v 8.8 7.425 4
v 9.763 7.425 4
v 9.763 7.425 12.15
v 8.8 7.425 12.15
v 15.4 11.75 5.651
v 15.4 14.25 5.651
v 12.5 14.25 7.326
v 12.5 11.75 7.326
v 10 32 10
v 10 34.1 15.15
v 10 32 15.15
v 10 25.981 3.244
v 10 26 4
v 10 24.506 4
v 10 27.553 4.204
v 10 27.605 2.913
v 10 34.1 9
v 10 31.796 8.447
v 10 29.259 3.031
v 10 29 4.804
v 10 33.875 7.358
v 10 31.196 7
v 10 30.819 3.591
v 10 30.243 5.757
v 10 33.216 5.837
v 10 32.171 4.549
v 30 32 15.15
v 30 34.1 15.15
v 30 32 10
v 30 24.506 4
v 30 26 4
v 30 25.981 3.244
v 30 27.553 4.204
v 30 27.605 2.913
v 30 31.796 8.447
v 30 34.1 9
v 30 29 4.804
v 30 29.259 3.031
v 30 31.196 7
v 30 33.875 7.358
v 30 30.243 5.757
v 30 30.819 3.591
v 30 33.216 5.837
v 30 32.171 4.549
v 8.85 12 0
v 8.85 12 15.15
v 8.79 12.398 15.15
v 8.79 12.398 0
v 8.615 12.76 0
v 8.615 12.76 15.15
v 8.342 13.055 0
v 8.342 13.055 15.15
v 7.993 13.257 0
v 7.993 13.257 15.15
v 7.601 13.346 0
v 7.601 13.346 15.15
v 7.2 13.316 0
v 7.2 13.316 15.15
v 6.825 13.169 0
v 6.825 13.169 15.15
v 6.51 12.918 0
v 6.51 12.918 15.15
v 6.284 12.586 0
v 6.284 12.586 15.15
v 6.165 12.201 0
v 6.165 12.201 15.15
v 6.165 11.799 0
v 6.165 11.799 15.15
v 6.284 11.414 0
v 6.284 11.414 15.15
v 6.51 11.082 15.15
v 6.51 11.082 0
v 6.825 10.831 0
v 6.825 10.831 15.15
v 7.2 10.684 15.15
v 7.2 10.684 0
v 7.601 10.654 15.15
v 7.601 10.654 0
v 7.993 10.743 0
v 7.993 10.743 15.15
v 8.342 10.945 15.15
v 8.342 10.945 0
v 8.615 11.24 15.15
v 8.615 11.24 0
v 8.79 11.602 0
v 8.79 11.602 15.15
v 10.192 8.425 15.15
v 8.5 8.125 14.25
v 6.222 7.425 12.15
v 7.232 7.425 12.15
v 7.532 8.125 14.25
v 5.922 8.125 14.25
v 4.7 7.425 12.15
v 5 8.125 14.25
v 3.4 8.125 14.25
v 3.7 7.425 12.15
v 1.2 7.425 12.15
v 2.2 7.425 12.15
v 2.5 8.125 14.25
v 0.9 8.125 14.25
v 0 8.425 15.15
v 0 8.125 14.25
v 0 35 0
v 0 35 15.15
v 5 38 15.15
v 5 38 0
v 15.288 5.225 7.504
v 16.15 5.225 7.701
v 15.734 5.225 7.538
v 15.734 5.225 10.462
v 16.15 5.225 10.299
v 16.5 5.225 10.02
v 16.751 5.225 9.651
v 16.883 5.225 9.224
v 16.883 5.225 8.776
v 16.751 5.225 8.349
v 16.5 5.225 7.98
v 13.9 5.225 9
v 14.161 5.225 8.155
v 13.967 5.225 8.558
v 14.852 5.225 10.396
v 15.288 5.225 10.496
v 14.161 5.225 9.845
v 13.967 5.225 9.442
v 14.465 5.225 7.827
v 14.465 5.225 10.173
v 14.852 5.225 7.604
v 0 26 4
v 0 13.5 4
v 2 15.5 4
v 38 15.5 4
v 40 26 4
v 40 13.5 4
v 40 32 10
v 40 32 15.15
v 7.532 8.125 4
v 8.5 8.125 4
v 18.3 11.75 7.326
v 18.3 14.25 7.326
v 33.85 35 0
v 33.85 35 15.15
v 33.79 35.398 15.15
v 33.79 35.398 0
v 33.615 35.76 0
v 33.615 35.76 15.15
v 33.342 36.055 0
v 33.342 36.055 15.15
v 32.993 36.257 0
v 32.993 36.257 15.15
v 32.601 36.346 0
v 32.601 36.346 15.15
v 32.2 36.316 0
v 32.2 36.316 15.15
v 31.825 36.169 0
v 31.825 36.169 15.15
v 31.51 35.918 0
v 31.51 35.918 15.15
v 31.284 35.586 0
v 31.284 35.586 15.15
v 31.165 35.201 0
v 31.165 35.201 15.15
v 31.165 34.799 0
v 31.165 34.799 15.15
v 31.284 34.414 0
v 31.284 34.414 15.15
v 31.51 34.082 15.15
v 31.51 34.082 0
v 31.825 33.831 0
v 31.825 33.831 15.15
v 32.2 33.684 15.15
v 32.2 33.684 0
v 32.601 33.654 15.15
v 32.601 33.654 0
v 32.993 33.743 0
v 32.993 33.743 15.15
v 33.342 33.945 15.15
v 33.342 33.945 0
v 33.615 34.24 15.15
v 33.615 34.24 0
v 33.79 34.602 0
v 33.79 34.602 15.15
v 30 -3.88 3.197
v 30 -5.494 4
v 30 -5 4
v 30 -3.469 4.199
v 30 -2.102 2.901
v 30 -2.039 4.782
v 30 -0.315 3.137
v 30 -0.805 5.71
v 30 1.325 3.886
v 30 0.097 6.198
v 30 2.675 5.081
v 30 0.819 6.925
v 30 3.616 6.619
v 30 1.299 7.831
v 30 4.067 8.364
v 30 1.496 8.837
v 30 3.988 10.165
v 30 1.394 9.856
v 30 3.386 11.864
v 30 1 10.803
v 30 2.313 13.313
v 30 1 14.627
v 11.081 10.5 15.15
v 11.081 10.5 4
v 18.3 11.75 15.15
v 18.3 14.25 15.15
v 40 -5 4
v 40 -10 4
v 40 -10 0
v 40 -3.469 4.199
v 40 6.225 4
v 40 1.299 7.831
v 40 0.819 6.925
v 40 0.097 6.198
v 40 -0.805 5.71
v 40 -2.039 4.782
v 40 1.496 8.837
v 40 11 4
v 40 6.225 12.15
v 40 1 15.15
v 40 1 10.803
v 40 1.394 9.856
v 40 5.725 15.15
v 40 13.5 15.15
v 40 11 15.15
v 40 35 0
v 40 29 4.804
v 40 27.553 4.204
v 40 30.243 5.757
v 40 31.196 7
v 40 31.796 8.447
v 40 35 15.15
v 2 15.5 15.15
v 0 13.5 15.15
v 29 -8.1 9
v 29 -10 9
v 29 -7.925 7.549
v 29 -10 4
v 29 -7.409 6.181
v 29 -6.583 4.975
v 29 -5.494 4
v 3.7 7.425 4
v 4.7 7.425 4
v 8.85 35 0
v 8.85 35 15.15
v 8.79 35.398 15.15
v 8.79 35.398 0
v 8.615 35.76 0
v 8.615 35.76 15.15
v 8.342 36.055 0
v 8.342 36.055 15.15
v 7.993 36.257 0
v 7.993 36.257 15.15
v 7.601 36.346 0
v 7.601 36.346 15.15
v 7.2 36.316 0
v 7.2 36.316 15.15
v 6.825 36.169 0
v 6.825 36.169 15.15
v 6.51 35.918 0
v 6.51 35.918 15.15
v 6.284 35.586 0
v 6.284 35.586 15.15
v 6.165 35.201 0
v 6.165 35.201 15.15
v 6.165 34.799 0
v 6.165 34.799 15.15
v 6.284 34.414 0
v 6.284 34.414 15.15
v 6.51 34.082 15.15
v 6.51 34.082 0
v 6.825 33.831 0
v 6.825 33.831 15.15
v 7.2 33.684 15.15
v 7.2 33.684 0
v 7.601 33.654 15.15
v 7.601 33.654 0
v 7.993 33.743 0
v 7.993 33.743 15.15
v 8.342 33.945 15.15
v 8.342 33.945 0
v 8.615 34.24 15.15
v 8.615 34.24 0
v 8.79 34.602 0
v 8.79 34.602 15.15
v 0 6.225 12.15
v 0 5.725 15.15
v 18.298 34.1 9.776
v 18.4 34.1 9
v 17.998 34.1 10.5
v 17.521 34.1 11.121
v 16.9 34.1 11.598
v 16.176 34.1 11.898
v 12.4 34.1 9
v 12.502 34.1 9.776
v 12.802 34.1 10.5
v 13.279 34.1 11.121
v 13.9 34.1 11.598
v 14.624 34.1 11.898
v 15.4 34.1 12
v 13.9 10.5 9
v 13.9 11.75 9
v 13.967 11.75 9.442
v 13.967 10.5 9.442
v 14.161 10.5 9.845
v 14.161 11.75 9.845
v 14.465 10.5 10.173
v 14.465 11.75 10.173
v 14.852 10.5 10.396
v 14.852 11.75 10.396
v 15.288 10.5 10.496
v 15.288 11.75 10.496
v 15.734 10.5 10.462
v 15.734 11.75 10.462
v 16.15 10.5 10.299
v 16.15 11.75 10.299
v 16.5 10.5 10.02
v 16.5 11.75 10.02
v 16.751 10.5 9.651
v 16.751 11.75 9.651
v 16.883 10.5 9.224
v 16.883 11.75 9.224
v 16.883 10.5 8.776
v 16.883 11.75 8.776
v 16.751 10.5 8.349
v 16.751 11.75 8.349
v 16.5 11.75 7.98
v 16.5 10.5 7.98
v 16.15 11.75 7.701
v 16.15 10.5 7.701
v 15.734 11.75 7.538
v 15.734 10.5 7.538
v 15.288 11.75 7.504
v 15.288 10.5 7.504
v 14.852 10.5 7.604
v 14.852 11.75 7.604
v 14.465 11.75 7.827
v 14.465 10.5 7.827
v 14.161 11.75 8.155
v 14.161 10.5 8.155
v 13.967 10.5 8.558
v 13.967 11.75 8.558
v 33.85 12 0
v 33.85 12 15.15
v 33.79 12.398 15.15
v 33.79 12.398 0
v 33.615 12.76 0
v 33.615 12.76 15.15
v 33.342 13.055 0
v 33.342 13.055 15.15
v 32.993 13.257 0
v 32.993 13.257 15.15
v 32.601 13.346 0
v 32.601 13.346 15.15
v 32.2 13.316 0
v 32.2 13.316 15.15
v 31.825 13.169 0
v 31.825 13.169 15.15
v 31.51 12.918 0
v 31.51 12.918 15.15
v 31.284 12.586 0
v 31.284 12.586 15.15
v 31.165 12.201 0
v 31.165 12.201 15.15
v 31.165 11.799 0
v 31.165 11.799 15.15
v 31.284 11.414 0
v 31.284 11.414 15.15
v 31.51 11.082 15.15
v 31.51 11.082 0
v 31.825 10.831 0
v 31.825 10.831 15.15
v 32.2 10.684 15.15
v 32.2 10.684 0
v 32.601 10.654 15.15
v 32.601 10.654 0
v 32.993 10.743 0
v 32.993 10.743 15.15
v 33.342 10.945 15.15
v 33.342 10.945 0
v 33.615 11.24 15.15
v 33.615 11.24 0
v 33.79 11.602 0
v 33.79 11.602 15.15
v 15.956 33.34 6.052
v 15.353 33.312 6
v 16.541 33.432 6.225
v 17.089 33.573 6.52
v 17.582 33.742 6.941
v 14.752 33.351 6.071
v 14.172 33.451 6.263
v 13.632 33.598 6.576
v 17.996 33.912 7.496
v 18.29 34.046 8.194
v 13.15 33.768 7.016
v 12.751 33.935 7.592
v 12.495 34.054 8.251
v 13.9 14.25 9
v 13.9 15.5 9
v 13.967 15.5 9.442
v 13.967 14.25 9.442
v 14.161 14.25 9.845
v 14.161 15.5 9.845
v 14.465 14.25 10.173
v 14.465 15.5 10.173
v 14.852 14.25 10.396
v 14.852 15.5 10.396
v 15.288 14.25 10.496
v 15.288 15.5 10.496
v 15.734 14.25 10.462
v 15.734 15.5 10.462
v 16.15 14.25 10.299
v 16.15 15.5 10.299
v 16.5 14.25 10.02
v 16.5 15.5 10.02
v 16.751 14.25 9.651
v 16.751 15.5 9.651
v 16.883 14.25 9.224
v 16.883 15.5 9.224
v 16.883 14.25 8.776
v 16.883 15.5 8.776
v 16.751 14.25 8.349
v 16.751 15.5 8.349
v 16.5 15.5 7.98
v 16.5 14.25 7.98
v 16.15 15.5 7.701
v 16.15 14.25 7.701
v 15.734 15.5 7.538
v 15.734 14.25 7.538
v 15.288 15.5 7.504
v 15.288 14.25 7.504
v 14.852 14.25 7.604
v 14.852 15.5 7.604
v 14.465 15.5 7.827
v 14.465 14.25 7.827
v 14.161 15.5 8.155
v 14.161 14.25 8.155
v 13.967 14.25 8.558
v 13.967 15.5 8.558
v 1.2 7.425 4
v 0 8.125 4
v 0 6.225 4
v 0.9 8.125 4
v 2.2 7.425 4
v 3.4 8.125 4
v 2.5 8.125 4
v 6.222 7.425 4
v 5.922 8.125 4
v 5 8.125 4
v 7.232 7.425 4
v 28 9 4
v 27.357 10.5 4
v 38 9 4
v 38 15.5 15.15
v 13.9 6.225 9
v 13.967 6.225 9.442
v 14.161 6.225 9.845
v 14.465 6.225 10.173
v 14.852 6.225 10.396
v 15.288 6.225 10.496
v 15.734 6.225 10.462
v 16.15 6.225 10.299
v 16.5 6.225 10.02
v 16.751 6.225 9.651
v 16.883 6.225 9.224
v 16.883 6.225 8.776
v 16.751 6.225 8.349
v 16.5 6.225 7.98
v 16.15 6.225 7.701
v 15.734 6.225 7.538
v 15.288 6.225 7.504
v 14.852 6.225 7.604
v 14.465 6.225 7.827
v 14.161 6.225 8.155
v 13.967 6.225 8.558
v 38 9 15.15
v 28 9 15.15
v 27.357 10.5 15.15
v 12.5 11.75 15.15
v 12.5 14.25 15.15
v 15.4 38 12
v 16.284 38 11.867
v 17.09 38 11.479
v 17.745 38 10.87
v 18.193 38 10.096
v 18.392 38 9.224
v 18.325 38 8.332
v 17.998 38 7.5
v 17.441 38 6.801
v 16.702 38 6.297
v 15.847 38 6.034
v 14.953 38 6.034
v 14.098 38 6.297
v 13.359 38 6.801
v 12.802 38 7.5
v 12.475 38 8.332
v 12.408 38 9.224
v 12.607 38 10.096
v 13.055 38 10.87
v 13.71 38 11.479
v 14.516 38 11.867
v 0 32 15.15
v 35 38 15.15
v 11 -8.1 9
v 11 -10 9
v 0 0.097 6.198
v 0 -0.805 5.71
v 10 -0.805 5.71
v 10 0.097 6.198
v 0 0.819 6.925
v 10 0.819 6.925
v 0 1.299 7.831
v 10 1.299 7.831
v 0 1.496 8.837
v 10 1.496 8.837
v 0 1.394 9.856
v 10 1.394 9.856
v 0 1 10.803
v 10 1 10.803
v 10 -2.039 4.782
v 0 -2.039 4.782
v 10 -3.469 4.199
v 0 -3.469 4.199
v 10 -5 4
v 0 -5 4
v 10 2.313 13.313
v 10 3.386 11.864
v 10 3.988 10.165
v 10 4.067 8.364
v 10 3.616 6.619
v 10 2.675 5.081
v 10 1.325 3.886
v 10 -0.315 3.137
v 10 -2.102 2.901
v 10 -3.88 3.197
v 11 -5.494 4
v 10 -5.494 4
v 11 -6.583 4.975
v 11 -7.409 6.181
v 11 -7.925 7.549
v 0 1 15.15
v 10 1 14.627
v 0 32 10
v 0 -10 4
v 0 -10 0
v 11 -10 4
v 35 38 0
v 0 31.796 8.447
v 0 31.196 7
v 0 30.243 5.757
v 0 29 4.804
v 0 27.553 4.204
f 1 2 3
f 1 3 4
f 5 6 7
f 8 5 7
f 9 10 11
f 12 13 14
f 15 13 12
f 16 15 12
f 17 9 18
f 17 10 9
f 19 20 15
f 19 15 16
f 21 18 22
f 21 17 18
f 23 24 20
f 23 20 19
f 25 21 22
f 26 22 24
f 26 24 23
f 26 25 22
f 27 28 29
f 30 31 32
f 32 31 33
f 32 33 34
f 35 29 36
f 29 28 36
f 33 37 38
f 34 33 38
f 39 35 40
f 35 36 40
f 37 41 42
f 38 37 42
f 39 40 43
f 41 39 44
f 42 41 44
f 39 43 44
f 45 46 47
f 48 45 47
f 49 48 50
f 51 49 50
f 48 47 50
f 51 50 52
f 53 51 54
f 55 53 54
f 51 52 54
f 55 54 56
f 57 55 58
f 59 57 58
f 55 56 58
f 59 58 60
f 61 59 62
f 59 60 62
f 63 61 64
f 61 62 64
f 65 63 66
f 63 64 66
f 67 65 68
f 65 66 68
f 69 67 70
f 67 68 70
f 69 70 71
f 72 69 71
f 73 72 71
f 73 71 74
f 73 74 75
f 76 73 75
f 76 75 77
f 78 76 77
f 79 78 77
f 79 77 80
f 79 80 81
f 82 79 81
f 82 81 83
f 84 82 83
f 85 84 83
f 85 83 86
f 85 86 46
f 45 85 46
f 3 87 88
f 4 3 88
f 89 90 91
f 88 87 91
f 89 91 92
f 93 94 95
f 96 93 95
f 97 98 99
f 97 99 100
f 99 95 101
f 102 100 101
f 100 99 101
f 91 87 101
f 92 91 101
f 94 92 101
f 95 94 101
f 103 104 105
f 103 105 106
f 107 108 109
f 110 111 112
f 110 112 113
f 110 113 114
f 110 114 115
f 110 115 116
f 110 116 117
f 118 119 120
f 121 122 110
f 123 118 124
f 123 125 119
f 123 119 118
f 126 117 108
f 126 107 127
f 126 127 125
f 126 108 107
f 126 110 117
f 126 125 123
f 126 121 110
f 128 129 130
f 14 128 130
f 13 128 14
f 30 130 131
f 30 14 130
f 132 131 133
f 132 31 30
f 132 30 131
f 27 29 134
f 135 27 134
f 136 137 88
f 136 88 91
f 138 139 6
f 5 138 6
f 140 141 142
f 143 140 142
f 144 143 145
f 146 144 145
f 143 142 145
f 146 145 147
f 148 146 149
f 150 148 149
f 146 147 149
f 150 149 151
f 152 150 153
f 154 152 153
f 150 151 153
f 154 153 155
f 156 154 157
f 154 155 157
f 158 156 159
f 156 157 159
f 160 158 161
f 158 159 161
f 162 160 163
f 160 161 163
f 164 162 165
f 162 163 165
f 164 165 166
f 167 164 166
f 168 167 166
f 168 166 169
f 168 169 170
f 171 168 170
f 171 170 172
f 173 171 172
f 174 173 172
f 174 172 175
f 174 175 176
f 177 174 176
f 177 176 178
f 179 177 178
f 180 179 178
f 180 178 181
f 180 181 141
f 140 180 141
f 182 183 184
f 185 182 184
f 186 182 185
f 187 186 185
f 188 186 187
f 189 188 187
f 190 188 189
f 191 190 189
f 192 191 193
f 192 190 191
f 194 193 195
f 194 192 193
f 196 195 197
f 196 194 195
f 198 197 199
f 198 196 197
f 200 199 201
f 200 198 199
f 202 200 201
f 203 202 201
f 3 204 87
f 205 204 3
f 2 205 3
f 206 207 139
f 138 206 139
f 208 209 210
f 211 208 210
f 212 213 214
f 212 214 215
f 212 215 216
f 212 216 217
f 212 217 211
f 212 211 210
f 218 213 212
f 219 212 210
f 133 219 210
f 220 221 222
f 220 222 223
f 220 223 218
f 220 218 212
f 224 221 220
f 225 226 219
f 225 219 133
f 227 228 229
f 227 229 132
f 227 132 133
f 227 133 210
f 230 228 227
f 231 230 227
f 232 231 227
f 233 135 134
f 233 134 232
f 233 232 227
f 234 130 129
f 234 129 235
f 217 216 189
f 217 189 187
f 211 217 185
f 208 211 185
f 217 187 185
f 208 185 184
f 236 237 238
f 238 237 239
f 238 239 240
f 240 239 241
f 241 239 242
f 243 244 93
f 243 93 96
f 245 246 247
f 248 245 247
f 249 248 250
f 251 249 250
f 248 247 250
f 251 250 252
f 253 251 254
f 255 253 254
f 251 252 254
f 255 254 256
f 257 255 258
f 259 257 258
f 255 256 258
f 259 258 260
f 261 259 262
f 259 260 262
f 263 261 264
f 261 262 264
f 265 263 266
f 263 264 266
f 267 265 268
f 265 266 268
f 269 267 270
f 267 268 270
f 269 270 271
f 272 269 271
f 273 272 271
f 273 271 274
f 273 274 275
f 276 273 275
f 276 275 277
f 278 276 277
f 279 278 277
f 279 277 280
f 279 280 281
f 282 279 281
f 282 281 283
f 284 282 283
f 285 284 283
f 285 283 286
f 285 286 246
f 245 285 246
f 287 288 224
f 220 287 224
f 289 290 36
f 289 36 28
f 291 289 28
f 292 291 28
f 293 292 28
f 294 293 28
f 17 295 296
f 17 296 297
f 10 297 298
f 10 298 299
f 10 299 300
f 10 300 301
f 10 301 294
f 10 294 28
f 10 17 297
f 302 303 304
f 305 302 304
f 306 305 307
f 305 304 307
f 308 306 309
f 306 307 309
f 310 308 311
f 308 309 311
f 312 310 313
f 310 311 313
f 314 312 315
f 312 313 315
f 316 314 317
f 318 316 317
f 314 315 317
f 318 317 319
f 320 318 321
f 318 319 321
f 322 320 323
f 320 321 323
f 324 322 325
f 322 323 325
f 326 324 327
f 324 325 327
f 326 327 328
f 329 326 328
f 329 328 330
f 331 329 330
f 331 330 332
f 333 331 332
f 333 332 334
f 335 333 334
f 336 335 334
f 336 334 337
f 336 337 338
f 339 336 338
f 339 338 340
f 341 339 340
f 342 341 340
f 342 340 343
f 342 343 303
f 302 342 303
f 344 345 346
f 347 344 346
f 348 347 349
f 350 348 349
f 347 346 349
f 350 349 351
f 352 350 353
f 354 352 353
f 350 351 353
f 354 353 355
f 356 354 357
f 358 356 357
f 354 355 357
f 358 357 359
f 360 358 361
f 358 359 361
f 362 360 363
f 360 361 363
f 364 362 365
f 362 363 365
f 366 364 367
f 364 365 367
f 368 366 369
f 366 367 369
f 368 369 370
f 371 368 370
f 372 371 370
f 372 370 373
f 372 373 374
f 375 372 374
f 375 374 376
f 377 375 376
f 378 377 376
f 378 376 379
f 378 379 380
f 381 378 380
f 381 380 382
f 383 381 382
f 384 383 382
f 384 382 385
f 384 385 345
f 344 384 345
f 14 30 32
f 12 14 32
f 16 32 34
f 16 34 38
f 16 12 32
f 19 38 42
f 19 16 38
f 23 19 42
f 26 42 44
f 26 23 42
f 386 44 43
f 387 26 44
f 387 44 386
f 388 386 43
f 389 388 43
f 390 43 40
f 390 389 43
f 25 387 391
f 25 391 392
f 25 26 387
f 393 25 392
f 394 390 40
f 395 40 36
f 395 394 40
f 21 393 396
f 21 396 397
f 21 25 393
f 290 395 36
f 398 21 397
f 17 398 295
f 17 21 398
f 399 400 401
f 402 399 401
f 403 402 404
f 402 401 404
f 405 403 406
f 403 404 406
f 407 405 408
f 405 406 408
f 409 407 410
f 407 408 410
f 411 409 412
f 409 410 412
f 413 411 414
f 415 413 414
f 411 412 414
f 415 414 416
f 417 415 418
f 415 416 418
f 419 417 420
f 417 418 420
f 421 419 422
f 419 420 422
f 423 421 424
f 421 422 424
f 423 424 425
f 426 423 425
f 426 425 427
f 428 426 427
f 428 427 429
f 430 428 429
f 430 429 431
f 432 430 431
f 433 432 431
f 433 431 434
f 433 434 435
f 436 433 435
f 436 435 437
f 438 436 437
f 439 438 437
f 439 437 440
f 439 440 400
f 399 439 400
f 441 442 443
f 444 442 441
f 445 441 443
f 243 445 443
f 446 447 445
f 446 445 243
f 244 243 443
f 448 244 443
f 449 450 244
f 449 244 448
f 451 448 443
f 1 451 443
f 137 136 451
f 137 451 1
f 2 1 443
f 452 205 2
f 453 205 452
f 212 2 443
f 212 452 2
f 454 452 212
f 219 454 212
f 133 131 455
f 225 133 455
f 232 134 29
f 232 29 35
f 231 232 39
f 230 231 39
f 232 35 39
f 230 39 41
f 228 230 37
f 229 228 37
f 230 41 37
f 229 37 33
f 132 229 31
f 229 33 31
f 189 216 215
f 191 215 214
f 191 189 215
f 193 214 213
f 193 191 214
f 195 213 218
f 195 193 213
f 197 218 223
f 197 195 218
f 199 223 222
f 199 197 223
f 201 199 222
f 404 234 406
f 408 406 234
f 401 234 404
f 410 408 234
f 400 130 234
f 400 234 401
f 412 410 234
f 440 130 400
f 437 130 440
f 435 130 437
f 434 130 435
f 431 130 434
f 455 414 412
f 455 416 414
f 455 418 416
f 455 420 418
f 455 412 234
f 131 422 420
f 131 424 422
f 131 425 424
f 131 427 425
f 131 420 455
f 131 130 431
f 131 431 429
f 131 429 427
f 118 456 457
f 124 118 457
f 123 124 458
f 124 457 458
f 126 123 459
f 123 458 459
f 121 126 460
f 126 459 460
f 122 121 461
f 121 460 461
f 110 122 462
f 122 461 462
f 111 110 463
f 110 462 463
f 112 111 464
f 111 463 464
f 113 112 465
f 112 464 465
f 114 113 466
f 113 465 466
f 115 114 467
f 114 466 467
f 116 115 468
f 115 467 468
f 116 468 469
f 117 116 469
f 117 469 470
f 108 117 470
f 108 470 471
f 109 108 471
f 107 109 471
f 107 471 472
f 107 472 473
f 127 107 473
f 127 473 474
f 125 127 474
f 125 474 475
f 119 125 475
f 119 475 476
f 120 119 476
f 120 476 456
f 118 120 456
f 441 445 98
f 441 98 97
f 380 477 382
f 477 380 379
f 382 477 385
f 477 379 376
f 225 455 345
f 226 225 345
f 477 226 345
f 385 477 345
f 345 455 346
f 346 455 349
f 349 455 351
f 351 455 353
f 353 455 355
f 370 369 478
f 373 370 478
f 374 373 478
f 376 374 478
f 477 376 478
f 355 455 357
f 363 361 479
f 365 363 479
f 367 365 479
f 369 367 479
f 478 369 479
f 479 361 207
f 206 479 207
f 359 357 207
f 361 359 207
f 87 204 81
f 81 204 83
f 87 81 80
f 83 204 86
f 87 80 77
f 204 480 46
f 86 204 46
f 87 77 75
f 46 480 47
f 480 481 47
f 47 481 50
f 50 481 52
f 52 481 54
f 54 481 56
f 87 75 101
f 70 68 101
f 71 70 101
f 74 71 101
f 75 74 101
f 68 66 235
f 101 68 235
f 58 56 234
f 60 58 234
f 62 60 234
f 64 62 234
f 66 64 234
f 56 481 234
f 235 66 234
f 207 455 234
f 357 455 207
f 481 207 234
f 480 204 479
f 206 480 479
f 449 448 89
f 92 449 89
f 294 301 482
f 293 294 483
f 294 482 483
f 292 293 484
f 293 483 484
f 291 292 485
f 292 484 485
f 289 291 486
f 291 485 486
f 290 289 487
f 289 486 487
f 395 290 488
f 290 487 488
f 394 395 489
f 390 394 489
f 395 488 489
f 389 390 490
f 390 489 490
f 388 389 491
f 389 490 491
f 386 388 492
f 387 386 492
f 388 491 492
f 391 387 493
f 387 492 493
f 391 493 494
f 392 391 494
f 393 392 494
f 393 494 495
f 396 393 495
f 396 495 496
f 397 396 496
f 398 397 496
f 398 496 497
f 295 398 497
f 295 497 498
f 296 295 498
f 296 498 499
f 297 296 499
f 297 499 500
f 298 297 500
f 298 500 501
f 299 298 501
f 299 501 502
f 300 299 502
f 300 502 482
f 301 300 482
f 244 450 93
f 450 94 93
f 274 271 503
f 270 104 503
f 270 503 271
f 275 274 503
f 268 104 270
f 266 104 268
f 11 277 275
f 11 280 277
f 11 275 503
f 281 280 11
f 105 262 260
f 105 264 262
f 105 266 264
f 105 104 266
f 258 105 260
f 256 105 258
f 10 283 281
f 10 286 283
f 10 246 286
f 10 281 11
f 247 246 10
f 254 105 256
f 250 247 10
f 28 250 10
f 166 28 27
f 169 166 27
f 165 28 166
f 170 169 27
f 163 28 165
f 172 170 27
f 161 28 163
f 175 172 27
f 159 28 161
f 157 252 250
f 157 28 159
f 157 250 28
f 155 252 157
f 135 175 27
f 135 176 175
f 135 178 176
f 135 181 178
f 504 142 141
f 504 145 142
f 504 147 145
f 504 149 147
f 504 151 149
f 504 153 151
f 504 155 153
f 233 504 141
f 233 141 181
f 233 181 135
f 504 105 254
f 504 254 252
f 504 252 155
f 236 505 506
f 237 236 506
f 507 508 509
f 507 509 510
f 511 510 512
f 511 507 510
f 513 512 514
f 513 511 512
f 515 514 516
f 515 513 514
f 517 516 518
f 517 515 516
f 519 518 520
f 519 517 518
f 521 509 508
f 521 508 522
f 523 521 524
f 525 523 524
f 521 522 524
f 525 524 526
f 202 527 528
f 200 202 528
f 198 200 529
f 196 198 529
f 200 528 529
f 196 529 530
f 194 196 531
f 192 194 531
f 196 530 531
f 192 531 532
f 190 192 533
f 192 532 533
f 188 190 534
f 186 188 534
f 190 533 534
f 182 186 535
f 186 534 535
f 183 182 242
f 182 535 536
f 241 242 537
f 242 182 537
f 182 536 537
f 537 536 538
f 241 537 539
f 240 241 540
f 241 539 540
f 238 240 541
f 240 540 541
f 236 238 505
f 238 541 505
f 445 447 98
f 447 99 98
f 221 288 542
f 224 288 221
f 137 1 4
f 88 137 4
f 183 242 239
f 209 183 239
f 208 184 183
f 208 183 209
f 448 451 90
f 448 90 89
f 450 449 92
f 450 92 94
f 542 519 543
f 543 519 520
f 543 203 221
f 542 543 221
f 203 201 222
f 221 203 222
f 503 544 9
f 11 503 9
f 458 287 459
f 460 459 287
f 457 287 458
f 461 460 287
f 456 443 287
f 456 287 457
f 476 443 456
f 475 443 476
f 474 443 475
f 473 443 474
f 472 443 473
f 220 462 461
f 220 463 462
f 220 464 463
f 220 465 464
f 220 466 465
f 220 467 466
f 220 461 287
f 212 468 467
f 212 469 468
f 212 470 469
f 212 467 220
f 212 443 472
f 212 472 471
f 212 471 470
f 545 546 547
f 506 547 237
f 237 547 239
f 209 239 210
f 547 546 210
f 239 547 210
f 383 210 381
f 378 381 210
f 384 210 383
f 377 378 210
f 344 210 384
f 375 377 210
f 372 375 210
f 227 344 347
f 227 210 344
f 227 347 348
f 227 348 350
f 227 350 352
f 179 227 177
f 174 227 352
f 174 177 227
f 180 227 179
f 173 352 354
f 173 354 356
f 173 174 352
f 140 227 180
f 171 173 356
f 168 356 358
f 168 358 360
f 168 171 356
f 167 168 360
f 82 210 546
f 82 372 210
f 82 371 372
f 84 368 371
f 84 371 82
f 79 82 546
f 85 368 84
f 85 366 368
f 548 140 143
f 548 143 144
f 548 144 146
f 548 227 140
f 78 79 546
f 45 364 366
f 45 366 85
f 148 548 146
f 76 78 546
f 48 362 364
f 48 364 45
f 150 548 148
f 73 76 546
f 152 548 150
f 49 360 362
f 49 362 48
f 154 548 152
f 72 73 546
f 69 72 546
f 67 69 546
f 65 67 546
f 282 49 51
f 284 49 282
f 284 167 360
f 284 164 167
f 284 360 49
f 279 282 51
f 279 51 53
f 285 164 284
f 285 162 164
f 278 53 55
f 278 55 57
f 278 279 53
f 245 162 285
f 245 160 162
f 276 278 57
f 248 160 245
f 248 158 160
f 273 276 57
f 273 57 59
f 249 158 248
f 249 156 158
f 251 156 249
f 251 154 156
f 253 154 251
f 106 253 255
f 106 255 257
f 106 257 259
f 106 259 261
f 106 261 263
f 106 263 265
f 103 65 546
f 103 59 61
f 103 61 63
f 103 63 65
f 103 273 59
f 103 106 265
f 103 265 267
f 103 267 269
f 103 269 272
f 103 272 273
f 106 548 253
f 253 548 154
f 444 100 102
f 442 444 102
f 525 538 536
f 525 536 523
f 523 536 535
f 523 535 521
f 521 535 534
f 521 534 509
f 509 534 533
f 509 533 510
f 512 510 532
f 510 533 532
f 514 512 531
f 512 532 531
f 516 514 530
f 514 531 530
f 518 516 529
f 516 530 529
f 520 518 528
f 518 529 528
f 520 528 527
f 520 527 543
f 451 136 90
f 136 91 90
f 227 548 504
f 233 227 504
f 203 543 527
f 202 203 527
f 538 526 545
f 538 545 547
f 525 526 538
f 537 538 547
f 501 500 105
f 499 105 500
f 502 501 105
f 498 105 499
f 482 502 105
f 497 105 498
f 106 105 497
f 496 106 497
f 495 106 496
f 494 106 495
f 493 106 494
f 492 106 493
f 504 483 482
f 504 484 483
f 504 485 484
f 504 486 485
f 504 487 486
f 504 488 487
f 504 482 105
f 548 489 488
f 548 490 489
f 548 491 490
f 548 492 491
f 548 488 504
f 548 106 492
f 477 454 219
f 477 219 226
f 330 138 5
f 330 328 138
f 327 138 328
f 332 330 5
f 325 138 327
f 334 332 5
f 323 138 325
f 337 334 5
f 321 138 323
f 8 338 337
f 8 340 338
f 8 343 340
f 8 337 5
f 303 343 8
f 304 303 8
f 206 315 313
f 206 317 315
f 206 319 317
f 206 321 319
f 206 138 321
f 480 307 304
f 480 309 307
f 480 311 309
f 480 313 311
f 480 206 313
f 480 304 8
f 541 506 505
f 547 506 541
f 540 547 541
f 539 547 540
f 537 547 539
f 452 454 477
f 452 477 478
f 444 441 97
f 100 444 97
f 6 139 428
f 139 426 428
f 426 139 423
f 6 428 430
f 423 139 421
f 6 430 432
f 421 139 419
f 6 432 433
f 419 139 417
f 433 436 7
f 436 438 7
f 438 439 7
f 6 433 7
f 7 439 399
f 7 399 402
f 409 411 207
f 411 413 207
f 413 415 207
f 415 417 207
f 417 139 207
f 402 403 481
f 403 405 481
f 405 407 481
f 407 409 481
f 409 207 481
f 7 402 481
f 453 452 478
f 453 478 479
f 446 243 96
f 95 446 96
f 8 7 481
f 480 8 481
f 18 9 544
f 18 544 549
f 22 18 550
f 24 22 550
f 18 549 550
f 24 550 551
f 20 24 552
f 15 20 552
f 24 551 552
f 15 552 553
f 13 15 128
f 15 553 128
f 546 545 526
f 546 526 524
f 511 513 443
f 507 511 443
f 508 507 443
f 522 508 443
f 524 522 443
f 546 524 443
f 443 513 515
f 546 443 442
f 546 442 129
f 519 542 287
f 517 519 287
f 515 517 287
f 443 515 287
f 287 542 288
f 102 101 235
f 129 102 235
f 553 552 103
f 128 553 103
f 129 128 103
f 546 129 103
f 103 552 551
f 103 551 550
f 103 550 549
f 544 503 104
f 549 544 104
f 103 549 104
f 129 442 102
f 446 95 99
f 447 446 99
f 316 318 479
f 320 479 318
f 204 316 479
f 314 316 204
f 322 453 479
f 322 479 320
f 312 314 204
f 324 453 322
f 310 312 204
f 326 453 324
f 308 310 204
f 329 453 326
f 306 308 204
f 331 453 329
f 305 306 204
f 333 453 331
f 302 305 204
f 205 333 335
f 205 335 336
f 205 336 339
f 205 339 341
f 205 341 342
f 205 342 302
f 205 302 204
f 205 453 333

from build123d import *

# Parameters (mm, degrees)
SKETCH1_W                = 40
SKETCH1_H                = 48
BOSS_EXTRUDE1_DEPTH      = 4
BOSS_EXTRUDE2_DEPTH      = 11.15
BOSS_EXTRUDE2_DEPTH_BACK = 4
SKETCH5_W                = 40
SKETCH5_H                = 5.225
SKETCH5_W_2              = 18
SKETCH5_H_2              = 5
SKETCH5_H_3              = 6
FILLET1_DEPTH            = 40
SKETCH6_R                = 1.35
CUT_EXTRUDE4_DEPTH       = 58.214705278
CHAMFER2_SIZE            = 2
CHAMFER3_SIZE            = 3
CHAMFER3_SIZE2           = 1
CHAMFER4_SIZE            = 3
CHAMFER4_SIZE2           = 0.5
CUT_EXTRUDE6_DEPTH       = 10
CUT_EXTRUDE6_DEPTH_BACK  = 10
CUT_EXTRUDE8_REACH       = 66.292
SKETCH12_R               = 3
SKETCH13_R               = 1.5
CUT_EXTRUDE10_DEPTH      = 10.275
CUT_EXTRUDE7_DEPTH       = 1.25
CUT_EXTRUDE7_DEPTH_BACK  = 1.25
CHAMFER5_SIZE            = 5
CHAMFER5_SIZE2           = 3
CHAMFER6_SIZE            = 3
CHAMFER6_SIZE2           = 5
CUT_EXTRUDE12_DEPTH      = 46.535947422
CUT_EXTRUDE12_DEPTH_BACK = 46.535947422
SKETCH15_R               = 3.5


with BuildPart() as part:
    # Sketch1 → Boss-Extrude1 (new body)
    with BuildSketch(Plane.XY):
        with Locations((20, 14)):
            Rectangle(SKETCH1_W, SKETCH1_H)
    extrude(amount=BOSS_EXTRUDE1_DEPTH)

    # Sketch5 → Boss-Extrude2 (add, two sides: drawn at the far end of the back side and taken through both)
    with BuildSketch(Plane.XY.offset(4).offset(-BOSS_EXTRUDE2_DEPTH_BACK)):
        Polygon((0.9, 8.125), (0, 8.125), (0, 15.5), (40, 15.5), (40, 9), (28, 9), (27.357142857, 10.5), (11.081237185, 10.5), (9.763380042, 7.425), (8.800403155, 7.425), (8.500403155, 8.125), (7.531690021, 8.125), (7.231690021, 7.425), (6.221941609, 7.425), (5.921941609, 8.125), (5, 8.125), (4.7, 7.425), (3.7, 7.425), (3.4, 8.125), (2.5, 8.125), (2.2, 7.425), (1.2, 7.425), align=None)
        with Locations((20, 3.6125)):
            Rectangle(SKETCH5_W, SKETCH5_H)
        with Locations((20, -7.5)):
            Rectangle(SKETCH5_W_2, SKETCH5_H_2)
        with Locations((20, 35)):
            Rectangle(SKETCH5_W, SKETCH5_H_3)
    extrude(amount=BOSS_EXTRUDE2_DEPTH + BOSS_EXTRUDE2_DEPTH_BACK)

    # Fillet1: read off the stored shape, not the designer's step
    # Fillet1 outline → Fillet1 (add)
    with BuildSketch(Plane.YZ):
        with BuildLine():
            Line((32, 4), (32, 10))
            ThreePointArc((32, 10), (30.242640687, 5.757359313), (26, 4))
            Line((26, 4), (32, 4))
        make_face()
        with BuildLine():
            Line((1, 4), (1, 10))
            ThreePointArc((1, 10), (-0.757359313, 5.757359313), (-5, 4))
            Line((-5, 4), (1, 4))
        make_face()
    extrude(amount=FILLET1_DEPTH)

    # Sketch6 → Cut-Extrude4 (cut, through all)
    with BuildSketch(Plane.XY.offset(15.15)):
        with Locations((7.5, 35)):
            Circle(SKETCH6_R)
        with Locations((7.5, 12)):
            Circle(SKETCH6_R)
        with Locations((32.5, 35)):
            Circle(SKETCH6_R)
        with Locations((32.5, 12)):
            Circle(SKETCH6_R)
    extrude(amount=-CUT_EXTRUDE4_DEPTH, mode=Mode.SUBTRACT)

    # Chamfer2
    chamfer2_edges = [part.edges().sort_by_distance(p)[0] for p in [
        (40, 9, 9.575),
        (0, 15.5, 9.575),
        (40, 15.5, 9.575),
    ]]
    chamfer(chamfer2_edges, length=CHAMFER2_SIZE)

    # Chamfer3
    chamfer3_edges = [part.edges().sort_by_distance(p)[0] for p in [
        (4.2, 7.425, 15.15),
    ]]
    chamfer3_side = [part.faces().sort_by_distance(p)[0] for p in [
        (4.2, 7.425, 9.575),
    ]]
    chamfer(chamfer3_edges, length=CHAMFER3_SIZE, length2=CHAMFER3_SIZE2, reference=chamfer3_side[0])

    # Chamfer4
    chamfer4_edges = [part.edges().sort_by_distance(p)[0] for p in [
        (20, 6.225, 15.15),
    ]]
    chamfer4_side = [part.faces().sort_by_distance(p)[0] for p in [
        (20, 6.225, 9.575),
    ]]
    chamfer(chamfer4_edges, length=CHAMFER4_SIZE, length2=CHAMFER4_SIZE2, reference=chamfer4_side[0])

    # Sketch8 → Cut-Extrude6 (cut, two sides: drawn at the far end of the back side and taken through both)
    with BuildSketch(Plane(origin=(20, 0, 0), x_dir=(0, 0, -1), z_dir=(1, 0, 0)).offset(-CUT_EXTRUDE6_DEPTH_BACK)):
        with BuildLine():
            Line((-9, 34.1), (-18.820916768, 34.1))
            Line((-18.820916768, 34.1), (-18.820916768, 21.9))
            Line((-18.820916768, 21.9), (-9, 21.9))
            ThreePointArc((-9, 21.9), (-2.9, 28), (-9, 34.1))
        make_face()
        with BuildLine():
            Line((-18.820916768, -10.472551988), (-18.820916768, -3.194214037))
            Line((-18.820916768, -3.194214037), (-13.313351365, 2.313351365))
            ThreePointArc((-13.313351365, 2.313351365), (-3.364334852, 0.334368937), (-9, -8.1))
            Line((-9, -8.1), (-9, -10.472551988))
            Line((-9, -10.472551988), (-18.820916768, -10.472551988))
        make_face()
    extrude(amount=CUT_EXTRUDE6_DEPTH + CUT_EXTRUDE6_DEPTH_BACK, mode=Mode.SUBTRACT)

    # Cut-Extrude8: up to this face of the body (flat: up to its plane)
    cut_extrude8_end = Plane(part.part.faces().sort_by_distance((20, 15.5, 9.575))[0])
    # Sketch12 → Cut-Extrude8 (cut, up to the picked face)
    with BuildSketch(Plane(origin=(0, 38, 0), x_dir=(1, 0, 0), z_dir=(0, 1, 0)), mode=Mode.PRIVATE) as cut_extrude8_sk1:
        with Locations(Location((15.4, -9, 0), (0, 0, 270))):
            Circle(SKETCH12_R)
    cut_extrude8_tool1 = split(extrude(cut_extrude8_sk1.sketch, amount=-CUT_EXTRUDE8_REACH, mode=Mode.PRIVATE), bisect_by=cut_extrude8_end, keep=Keep.BOTH, mode=Mode.PRIVATE)
    add(cut_extrude8_tool1.solids().sort_by(Axis((15.4, 38, 9), (0, -1, 0)))[0], mode=Mode.SUBTRACT)

    # Sketch13 → Cut-Extrude10 (cut)
    with BuildSketch(Plane(origin=(0, 15.5, 0), x_dir=(1, 0, 0), z_dir=(0, 1, 0))):
        with Locations(Location((15.4, -9, 0), (0, 0, 180))):
            Circle(SKETCH13_R)
    extrude(amount=-CUT_EXTRUDE10_DEPTH, mode=Mode.SUBTRACT)

    # Sketch9 → Cut-Extrude7 (cut, two sides: drawn at the far end of the back side and taken through both)
    with BuildSketch(Plane.XZ.offset(-13).offset(-CUT_EXTRUDE7_DEPTH_BACK)):
        Polygon((12.5, 16.815347994), (18.3, 16.815347994), (18.3, 7.325684219), (15.4, 5.651368439), (12.5, 7.325684219), align=None)
    extrude(amount=CUT_EXTRUDE7_DEPTH + CUT_EXTRUDE7_DEPTH_BACK, mode=Mode.SUBTRACT)

    # Chamfer5
    chamfer5_edges = [part.edges().sort_by_distance(p)[0] for p in [
        (0, 38, 7.575),
    ]]
    chamfer5_side = [part.faces().sort_by_distance(p)[0] for p in [
        (20.225127502, 38, 7.505259415),
    ]]
    chamfer(chamfer5_edges, length=CHAMFER5_SIZE, length2=CHAMFER5_SIZE2, reference=chamfer5_side[0])

    # Chamfer6
    chamfer6_edges = [part.edges().sort_by_distance(p)[0] for p in [
        (40, 38, 7.575),
    ]]
    chamfer6_side = [part.faces().sort_by_distance(p)[0] for p in [
        (40, 5.721658913, 8.075),
    ]]
    chamfer(chamfer6_edges, length=CHAMFER6_SIZE, length2=CHAMFER6_SIZE2, reference=chamfer6_side[0])

    # Sketch15 → Cut-Extrude12 (cut, two sides: drawn at the far end of the back side and taken through both)
    with BuildSketch(Plane(origin=(20, 0, 0), x_dir=(0, 0, -1), z_dir=(1, 0, 0)).offset(-CUT_EXTRUDE12_DEPTH_BACK)):
        with Locations((-9, -2)):
            Circle(SKETCH15_R)
    extrude(amount=CUT_EXTRUDE12_DEPTH + CUT_EXTRUDE12_DEPTH_BACK, mode=Mode.SUBTRACT)


solid = part.part
